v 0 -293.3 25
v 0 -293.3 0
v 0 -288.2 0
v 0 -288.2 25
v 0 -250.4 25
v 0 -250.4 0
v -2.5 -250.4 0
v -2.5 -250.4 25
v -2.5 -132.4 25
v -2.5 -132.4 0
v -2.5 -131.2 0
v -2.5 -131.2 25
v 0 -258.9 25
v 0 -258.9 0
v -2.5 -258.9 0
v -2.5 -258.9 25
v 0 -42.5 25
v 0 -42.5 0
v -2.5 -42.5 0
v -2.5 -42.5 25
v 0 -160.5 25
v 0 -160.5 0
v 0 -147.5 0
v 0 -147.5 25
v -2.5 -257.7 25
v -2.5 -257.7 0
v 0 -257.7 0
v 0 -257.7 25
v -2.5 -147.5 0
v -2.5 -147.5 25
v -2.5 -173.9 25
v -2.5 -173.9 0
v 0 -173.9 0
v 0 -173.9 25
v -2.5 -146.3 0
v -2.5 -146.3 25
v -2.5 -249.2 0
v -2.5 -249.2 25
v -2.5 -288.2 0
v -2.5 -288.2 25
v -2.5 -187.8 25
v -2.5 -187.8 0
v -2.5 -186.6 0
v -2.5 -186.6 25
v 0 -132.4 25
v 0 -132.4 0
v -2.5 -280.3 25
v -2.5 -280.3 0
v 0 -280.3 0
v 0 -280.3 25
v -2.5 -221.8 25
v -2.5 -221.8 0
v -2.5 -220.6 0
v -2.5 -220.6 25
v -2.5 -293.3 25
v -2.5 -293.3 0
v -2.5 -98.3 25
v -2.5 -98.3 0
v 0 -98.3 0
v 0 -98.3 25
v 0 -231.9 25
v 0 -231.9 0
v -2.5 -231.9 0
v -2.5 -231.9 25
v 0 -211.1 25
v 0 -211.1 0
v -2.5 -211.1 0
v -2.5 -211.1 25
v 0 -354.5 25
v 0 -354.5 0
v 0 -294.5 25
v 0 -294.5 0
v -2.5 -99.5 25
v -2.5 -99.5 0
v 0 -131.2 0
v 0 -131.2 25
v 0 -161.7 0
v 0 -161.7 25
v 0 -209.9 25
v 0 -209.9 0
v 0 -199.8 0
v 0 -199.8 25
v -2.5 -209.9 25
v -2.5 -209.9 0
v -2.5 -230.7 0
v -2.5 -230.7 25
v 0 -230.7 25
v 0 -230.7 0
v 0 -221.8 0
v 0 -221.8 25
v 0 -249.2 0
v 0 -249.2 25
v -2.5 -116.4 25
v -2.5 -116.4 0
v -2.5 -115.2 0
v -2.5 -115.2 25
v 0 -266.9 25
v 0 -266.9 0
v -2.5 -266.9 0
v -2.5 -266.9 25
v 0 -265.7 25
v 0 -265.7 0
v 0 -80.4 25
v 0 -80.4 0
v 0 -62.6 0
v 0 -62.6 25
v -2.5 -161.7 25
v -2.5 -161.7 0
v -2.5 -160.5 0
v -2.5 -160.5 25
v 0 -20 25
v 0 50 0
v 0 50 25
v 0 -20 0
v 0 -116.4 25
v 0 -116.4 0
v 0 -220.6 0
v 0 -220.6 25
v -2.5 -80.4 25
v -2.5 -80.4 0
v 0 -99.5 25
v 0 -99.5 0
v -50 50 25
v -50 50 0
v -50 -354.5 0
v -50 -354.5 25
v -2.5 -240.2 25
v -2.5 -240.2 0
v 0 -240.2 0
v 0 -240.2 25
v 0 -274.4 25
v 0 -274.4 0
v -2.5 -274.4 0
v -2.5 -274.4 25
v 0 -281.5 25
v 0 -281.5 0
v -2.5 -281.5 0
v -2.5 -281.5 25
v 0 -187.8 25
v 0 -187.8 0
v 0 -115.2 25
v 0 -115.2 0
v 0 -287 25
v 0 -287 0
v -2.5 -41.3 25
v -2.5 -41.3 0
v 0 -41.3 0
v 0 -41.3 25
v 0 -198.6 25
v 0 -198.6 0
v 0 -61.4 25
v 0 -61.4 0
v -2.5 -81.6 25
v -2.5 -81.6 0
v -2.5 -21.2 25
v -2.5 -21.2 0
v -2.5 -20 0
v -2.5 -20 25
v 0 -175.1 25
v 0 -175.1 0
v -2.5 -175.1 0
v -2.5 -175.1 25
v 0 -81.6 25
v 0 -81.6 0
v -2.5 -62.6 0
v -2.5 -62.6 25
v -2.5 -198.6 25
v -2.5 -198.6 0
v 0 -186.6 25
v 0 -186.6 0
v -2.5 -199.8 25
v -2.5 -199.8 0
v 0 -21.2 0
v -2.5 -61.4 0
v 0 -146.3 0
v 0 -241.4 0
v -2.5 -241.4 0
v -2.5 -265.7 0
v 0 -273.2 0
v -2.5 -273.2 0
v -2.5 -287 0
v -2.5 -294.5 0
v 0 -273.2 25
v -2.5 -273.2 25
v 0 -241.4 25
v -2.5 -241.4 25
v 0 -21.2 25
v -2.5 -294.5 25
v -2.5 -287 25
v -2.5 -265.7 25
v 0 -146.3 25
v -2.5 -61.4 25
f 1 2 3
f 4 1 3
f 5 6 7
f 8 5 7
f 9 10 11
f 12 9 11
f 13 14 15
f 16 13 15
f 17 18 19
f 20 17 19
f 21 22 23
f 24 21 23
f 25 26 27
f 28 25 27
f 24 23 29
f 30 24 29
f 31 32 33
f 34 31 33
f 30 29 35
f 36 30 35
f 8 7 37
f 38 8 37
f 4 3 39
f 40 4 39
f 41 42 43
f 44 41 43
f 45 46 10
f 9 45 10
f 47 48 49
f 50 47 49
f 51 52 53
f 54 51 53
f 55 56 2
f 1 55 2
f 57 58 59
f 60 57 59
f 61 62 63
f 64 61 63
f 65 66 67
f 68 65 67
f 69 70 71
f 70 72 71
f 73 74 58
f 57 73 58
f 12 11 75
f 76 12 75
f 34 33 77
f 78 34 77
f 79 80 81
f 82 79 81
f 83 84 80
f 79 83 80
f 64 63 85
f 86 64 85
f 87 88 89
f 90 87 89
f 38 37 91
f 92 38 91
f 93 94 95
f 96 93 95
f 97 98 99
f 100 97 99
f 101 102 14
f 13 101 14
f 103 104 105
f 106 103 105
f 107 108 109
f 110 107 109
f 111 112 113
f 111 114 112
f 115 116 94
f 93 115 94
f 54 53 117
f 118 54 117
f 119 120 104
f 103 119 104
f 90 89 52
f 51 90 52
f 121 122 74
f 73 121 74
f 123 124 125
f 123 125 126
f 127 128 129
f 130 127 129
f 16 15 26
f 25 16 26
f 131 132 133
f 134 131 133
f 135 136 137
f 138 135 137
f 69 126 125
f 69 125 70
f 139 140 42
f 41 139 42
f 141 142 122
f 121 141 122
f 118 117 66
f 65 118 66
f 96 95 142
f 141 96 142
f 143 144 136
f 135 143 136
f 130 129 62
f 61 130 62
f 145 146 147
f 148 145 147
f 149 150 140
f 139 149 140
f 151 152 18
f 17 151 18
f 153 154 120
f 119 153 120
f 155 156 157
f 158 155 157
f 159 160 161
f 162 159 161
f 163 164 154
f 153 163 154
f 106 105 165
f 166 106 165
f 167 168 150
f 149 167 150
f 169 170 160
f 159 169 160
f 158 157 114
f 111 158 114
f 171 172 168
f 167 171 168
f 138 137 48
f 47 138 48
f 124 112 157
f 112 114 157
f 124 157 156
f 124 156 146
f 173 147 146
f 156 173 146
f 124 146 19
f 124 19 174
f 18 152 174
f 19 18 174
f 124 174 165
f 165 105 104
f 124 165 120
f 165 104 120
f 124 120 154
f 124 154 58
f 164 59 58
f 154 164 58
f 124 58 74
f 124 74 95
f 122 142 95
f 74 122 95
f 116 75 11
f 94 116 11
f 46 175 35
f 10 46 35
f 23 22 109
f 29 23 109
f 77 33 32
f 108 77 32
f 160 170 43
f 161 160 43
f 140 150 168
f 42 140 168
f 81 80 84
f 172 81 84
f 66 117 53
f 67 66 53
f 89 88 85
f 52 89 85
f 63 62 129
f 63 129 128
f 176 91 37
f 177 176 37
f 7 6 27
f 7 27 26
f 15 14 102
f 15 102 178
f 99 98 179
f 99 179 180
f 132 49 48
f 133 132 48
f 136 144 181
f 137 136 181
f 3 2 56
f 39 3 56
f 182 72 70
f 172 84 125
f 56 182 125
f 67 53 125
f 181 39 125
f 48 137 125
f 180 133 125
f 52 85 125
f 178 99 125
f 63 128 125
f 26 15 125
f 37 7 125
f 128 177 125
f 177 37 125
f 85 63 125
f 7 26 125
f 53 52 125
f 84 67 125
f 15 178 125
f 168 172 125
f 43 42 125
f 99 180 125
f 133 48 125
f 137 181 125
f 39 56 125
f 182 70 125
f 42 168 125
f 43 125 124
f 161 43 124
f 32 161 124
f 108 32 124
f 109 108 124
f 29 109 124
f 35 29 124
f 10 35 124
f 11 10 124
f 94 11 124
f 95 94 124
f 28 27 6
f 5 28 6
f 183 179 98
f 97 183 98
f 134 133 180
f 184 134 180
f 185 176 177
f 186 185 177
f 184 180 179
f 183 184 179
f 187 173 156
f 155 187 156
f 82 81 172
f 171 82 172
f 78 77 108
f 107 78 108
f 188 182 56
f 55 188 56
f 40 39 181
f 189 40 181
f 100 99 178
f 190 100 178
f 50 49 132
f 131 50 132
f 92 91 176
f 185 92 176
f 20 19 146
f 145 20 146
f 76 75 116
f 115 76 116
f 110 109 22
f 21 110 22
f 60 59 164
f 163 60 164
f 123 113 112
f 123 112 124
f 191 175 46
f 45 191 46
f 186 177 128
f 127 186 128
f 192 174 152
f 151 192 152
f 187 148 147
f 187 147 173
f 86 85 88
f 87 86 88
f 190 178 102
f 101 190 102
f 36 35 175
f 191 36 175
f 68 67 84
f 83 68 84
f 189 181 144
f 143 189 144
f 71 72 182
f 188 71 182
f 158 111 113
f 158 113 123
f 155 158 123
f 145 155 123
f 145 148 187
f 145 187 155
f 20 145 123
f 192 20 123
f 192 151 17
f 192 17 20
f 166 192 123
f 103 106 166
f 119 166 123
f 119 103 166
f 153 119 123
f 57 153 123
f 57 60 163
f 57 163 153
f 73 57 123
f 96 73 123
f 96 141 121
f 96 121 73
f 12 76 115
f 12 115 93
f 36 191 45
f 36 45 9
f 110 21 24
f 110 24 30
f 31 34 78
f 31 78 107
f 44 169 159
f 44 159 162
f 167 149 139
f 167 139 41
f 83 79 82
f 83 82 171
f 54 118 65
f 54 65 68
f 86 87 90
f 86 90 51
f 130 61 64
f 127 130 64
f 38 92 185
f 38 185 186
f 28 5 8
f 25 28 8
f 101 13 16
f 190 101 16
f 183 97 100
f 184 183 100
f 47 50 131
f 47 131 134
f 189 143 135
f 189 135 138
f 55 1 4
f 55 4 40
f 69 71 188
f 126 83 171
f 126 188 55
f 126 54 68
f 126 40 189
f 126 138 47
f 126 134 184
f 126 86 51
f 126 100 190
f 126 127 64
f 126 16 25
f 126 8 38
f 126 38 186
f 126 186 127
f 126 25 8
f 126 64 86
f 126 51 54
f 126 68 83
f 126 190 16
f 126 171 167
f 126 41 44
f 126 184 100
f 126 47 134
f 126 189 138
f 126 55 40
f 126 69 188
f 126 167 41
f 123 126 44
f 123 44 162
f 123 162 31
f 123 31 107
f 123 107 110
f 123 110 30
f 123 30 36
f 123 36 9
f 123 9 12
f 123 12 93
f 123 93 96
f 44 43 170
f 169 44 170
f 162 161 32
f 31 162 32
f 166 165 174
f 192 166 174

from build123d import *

# Parameters (mm, degrees)
F1_DEPTH = 25
F2_W     = 50
F2_H     = 25
F3_DEPTH = 50
F4_W     = 50
F4_H     = 25
F5_DEPTH = 50


with BuildPart() as f1:
    # F0 (on Top) → F1 (new body)
    with BuildSketch(Plane.XY):
        Polygon((0, -20), (0, 0), (-50, 0), (-50, -304.5), (0, -304.5), (0, -294.5), (-2.5, -294.5), (-2.5, -293.3), (0, -293.3), (0, -288.2), (-2.5, -288.2), (-2.5, -287), (0, -287), (0, -281.5), (-2.5, -281.5), (-2.5, -280.3), (0, -280.3), (0, -274.4), (-2.5, -274.4), (-2.5, -273.2), (0, -273.2), (0, -266.9), (-2.5, -266.9), (-2.5, -265.7), (0, -265.7), (0, -258.9), (-2.5, -258.9), (-2.5, -257.7), (0, -257.7), (0, -250.4), (-2.5, -250.4), (-2.5, -249.2), (0, -249.2), (0, -241.4), (-2.5, -241.4), (-2.5, -240.2), (0, -240.2), (0, -231.9), (-2.5, -231.9), (-2.5, -230.7), (0, -230.7), (0, -221.8), (-2.5, -221.8), (-2.5, -220.6), (0, -220.6), (0, -211.1), (-2.5, -211.1), (-2.5, -209.9), (0, -209.9), (0, -199.8), (-2.5, -199.8), (-2.5, -198.6), (0, -198.6), (0, -187.8), (-2.5, -187.8), (-2.5, -186.6), (0, -186.6), (0, -175.1), (-2.5, -175.1), (-2.5, -173.9), (0, -173.9), (0, -161.7), (-2.5, -161.7), (-2.5, -160.5), (0, -160.5), (0, -147.5), (-2.5, -147.5), (-2.5, -146.3), (0, -146.3), (0, -132.4), (-2.5, -132.4), (-2.5, -131.2), (0, -131.2), (0, -116.4), (-2.5, -116.4), (-2.5, -115.2), (0, -115.2), (0, -99.5), (-2.5, -99.5), (-2.5, -98.3), (0, -98.3), (0, -81.6), (-2.5, -81.6), (-2.5, -80.4), (0, -80.4), (0, -62.6), (-2.5, -62.6), (-2.5, -61.4), (0, -61.4), (0, -42.5), (-2.5, -42.5), (-2.5, -41.3), (0, -41.3), (0, -21.2), (-2.5, -21.2), (-2.5, -20), align=None)
    extrude(amount=F1_DEPTH)

    # F2 (on face) → F3 (join)
    with BuildSketch(Plane.XZ.offset(304.5)):
        with Locations((-25, 12.5)):
            Rectangle(F2_W, F2_H)
    extrude(amount=F3_DEPTH)

    # F4 (on face) → F5 (join)
    with BuildSketch(Plane(origin=(0, 0, 0), x_dir=(-1, 0, 0), z_dir=(0, 1, 0))):
        with Locations((25, 12.5)):
            Rectangle(F4_W, F4_H)
    extrude(amount=F5_DEPTH)


solid = f1.part
